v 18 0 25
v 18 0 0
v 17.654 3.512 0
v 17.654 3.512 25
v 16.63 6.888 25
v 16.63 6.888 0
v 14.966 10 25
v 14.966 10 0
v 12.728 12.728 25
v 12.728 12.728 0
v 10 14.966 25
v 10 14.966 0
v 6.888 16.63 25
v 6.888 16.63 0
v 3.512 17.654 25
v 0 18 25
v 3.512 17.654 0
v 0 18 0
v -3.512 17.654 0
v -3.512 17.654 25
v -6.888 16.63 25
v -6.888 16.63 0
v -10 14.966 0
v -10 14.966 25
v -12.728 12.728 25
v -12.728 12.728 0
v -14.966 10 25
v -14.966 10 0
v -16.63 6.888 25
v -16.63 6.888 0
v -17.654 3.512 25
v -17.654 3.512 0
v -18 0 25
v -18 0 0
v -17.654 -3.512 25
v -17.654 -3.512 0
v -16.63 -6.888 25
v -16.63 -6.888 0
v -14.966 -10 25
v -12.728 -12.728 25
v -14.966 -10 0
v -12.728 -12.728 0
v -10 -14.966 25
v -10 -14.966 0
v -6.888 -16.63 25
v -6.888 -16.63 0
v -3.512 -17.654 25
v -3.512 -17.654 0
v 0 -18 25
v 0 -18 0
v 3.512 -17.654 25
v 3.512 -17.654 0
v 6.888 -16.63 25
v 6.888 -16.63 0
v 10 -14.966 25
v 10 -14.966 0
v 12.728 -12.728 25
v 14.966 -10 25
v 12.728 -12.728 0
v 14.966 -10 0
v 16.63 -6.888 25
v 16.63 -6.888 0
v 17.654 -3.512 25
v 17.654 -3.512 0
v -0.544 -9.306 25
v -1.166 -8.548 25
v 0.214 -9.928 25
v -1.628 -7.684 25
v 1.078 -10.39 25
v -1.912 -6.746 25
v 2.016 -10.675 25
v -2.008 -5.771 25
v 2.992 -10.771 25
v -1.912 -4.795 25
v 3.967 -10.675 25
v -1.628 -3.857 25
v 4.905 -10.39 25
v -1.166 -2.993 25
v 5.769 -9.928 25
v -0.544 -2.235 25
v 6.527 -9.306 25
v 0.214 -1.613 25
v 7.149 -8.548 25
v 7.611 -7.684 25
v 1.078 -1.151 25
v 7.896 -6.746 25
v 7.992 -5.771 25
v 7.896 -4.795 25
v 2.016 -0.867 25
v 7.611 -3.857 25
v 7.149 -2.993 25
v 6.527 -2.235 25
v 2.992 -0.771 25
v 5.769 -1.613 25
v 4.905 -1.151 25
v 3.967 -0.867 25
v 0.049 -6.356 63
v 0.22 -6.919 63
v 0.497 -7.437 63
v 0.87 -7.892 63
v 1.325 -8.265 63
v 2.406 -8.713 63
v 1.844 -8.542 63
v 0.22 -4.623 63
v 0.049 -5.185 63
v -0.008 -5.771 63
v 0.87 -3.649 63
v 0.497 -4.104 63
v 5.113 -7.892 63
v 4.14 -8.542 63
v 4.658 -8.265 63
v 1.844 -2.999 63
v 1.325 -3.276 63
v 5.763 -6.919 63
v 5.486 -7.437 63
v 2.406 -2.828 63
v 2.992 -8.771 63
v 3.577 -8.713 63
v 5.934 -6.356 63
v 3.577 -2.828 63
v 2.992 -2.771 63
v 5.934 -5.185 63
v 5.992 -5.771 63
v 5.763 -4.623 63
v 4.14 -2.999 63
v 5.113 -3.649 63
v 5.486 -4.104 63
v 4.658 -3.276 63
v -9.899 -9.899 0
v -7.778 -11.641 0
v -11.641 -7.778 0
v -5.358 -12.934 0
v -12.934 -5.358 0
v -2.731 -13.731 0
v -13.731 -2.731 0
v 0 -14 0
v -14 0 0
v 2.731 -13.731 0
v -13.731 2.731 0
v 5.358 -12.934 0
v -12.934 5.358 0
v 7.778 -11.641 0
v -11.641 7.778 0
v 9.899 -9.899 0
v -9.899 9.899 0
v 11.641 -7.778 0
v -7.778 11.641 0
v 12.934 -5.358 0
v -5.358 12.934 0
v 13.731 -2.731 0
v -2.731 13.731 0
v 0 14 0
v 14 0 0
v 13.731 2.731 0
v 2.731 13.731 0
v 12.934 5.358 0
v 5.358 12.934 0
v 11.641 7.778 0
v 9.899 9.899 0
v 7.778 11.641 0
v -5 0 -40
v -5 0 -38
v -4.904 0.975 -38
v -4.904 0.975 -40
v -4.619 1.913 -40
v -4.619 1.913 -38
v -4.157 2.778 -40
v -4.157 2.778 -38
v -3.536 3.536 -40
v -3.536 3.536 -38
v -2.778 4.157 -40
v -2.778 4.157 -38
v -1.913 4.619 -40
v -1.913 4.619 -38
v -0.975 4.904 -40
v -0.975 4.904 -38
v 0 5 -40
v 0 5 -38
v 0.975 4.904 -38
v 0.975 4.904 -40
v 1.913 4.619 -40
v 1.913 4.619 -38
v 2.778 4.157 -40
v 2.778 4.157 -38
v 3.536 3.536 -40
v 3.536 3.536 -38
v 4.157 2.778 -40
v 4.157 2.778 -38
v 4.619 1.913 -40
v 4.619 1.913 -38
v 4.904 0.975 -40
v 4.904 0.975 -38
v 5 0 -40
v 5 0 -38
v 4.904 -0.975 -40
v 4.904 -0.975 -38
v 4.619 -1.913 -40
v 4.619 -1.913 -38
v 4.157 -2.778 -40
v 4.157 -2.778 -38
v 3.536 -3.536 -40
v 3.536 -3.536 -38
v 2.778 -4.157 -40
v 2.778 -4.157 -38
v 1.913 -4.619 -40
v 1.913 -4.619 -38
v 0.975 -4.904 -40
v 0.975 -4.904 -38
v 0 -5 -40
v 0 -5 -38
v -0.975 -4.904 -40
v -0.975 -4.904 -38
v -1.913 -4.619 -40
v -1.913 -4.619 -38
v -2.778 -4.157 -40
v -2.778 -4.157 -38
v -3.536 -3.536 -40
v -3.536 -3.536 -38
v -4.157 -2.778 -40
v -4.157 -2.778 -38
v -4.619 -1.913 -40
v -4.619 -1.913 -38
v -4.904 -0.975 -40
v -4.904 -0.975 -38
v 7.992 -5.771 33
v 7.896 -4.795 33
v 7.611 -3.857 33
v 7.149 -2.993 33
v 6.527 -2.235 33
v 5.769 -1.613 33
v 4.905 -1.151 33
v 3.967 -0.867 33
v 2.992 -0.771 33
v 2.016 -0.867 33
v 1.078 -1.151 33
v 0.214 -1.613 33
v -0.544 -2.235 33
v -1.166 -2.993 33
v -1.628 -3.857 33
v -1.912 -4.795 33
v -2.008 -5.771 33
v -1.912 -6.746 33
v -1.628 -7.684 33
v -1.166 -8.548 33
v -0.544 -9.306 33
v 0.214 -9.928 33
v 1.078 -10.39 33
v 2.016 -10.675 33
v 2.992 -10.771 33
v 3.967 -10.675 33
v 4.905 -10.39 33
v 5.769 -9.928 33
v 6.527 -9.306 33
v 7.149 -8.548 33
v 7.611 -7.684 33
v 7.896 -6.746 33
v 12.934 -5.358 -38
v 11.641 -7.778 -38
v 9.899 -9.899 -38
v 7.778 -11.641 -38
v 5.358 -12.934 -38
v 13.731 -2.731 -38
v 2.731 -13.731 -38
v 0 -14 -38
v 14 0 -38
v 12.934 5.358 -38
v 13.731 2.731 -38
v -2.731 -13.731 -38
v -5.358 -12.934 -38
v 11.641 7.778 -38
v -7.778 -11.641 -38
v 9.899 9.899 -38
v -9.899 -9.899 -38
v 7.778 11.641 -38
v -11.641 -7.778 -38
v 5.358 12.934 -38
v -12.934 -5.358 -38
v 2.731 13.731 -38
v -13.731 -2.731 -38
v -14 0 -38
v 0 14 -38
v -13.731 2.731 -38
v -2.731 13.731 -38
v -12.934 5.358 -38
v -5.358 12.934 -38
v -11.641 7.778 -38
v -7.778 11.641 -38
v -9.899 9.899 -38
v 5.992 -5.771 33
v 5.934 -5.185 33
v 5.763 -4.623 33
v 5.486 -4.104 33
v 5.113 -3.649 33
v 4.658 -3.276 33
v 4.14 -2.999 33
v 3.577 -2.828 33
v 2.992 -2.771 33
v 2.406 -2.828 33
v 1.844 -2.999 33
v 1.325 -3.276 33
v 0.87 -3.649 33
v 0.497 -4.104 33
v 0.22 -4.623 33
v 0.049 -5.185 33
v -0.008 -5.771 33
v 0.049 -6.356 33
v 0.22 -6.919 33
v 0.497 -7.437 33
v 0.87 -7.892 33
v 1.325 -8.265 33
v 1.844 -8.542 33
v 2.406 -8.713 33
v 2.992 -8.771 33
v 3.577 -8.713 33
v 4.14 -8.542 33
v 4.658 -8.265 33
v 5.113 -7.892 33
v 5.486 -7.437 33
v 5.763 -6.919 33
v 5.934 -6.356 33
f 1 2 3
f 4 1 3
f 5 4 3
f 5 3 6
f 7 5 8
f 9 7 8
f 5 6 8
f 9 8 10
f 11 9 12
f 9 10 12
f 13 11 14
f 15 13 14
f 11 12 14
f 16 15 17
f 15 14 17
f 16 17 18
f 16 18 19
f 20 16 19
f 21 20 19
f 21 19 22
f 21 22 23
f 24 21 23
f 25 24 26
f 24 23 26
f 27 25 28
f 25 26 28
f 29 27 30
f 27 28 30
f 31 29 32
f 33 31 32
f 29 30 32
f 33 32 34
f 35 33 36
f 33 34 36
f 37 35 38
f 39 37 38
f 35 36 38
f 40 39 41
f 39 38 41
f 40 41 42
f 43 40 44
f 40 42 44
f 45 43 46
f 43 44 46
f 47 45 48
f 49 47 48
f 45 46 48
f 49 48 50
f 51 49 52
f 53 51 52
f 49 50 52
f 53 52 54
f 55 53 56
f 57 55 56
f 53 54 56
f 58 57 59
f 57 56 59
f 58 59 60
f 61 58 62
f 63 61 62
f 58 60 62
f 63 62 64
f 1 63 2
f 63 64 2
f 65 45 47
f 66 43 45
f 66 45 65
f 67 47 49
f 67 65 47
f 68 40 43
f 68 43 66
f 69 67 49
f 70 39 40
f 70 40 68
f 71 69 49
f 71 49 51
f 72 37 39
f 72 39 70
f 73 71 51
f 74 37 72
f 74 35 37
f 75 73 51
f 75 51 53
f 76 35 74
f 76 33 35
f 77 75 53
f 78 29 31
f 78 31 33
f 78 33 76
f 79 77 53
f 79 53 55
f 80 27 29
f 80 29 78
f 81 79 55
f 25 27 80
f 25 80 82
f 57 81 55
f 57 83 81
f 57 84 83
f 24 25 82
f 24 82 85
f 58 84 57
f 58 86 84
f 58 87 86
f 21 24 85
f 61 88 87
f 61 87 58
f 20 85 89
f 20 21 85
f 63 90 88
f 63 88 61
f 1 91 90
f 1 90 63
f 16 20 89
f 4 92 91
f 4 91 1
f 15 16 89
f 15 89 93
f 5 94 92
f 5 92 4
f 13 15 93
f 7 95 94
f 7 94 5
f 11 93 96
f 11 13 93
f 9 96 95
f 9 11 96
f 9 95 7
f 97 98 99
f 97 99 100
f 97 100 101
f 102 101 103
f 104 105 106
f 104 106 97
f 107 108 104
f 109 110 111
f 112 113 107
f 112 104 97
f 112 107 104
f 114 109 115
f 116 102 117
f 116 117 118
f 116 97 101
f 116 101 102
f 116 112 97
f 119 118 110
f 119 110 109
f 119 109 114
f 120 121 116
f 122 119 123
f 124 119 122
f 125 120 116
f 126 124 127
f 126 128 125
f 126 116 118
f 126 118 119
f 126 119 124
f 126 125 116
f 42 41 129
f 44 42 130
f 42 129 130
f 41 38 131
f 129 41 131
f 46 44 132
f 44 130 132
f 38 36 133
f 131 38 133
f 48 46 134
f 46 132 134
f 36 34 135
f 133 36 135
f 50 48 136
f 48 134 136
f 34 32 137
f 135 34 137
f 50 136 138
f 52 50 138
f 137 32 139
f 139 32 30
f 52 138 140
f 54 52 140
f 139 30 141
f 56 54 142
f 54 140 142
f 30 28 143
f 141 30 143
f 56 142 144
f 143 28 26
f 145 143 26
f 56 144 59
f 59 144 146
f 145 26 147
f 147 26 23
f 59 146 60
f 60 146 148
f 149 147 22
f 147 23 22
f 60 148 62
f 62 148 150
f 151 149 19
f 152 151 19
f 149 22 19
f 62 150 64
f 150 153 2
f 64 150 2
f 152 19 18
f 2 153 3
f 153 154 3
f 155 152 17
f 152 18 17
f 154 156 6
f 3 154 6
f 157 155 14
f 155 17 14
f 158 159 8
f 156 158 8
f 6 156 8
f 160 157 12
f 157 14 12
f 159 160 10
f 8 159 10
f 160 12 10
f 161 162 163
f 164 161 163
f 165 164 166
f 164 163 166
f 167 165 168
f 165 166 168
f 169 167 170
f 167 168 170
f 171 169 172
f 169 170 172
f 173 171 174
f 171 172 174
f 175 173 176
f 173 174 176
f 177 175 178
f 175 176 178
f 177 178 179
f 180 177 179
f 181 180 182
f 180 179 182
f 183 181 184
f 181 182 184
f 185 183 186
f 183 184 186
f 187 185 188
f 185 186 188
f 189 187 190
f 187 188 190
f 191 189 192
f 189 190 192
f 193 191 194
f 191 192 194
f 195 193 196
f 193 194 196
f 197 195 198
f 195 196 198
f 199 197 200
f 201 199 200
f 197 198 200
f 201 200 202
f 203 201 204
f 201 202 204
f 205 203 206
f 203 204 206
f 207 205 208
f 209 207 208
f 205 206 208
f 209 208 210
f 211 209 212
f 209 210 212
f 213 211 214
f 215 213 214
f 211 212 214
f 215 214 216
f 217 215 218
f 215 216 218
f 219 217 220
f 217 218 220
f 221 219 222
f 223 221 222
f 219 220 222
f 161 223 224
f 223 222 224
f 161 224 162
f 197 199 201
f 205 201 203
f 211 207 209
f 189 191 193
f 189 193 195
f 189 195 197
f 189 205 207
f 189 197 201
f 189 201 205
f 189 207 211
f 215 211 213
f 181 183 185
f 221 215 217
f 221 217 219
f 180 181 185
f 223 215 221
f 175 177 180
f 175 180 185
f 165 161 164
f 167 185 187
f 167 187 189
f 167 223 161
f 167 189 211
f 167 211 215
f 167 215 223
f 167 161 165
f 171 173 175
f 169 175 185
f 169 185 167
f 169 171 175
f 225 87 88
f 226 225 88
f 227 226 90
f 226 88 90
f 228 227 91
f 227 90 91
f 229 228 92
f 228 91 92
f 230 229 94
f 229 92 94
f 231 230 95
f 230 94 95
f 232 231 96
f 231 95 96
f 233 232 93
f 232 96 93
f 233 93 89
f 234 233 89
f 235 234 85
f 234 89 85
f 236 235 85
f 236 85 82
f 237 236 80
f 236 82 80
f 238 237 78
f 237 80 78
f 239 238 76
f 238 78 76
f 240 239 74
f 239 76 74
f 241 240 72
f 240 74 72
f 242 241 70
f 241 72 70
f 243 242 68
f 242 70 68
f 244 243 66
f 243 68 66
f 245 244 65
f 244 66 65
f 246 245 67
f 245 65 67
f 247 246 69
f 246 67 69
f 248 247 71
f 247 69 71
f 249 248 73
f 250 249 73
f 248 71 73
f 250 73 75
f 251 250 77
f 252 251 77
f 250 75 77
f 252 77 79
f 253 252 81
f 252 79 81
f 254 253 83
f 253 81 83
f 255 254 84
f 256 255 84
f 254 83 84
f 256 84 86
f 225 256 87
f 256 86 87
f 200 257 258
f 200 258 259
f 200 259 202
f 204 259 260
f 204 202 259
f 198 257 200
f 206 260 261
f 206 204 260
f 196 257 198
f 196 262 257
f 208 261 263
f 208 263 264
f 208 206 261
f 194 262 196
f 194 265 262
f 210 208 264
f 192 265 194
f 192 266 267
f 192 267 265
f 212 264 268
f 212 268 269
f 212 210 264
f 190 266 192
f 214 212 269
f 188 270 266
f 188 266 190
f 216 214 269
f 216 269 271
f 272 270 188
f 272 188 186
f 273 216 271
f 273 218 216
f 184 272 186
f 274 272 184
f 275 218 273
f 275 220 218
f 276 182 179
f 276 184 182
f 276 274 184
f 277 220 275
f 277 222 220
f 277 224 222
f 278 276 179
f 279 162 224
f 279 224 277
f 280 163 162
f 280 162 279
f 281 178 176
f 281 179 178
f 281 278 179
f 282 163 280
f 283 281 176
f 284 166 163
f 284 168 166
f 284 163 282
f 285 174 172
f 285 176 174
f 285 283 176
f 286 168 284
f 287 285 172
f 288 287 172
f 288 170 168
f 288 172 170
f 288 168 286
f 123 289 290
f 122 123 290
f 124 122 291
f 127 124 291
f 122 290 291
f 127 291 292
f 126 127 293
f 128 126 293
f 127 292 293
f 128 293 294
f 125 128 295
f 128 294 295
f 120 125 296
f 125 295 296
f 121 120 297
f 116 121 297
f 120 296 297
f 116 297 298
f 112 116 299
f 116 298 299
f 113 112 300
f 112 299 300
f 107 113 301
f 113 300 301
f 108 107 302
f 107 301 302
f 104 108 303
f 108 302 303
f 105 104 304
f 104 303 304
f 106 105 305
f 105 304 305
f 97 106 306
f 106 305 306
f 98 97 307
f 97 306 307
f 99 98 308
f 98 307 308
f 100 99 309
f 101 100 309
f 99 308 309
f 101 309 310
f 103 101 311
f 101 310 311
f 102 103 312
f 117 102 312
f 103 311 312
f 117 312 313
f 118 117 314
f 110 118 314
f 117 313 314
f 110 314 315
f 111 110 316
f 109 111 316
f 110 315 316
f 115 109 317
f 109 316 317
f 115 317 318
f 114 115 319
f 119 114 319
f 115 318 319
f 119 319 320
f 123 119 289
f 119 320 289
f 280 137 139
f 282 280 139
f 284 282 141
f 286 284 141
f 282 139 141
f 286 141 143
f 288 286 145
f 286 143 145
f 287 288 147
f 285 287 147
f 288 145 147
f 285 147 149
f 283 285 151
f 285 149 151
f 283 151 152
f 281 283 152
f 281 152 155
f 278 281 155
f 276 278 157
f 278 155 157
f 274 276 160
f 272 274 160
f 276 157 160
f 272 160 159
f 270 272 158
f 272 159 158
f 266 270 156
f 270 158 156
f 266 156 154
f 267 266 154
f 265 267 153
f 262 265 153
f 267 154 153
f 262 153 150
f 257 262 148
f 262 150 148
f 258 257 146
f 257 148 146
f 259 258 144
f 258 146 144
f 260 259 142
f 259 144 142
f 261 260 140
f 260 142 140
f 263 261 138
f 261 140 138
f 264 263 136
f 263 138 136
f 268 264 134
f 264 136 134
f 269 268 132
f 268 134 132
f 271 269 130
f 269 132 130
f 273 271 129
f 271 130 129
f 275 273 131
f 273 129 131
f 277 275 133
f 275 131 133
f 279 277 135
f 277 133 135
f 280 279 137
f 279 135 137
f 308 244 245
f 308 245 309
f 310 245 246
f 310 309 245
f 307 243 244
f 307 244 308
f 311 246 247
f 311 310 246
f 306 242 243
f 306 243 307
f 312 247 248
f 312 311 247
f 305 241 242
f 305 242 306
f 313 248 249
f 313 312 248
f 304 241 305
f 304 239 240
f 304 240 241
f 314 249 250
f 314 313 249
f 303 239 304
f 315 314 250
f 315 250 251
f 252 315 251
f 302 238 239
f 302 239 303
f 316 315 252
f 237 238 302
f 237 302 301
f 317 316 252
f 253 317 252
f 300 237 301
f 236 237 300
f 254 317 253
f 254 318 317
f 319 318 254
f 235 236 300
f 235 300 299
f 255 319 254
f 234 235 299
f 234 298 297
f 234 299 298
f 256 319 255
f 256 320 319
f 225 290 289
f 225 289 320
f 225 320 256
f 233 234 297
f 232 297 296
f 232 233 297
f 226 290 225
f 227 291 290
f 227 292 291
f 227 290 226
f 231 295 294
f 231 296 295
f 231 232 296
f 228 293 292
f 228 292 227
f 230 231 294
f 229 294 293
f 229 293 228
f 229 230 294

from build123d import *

# Parameters (mm, degrees)
SKETCH1_R           = 18
BOSS_EXTRUDE1_DEPTH = 25
SKETCH2_R           = 14
BOSS_EXTRUDE2_DEPTH = 38
SKETCH3_R           = 5
BOSS_EXTRUDE3_DEPTH = 2
SKETCH4_R           = 5
BOSS_EXTRUDE4_DEPTH = 8
SKETCH5_R           = 3
BOSS_EXTRUDE5_DEPTH = 30


with BuildPart() as part:
    # Sketch1 → Boss-Extrude1 (new body)
    with BuildSketch(Plane.XY):
        Circle(SKETCH1_R)
    extrude(amount=BOSS_EXTRUDE1_DEPTH)

    # Sketch2 → Boss-Extrude2 (add)
    with BuildSketch(Plane(origin=(0, 0, 0), x_dir=(-1, 0, 0), z_dir=(0, 0, -1))):
        Circle(SKETCH2_R)
    extrude(amount=BOSS_EXTRUDE2_DEPTH)

    # Sketch3 → Boss-Extrude3 (add)
    with BuildSketch(Plane(origin=(0, 0, -38), x_dir=(-1, 0, 0), z_dir=(0, 0, -1))):
        Circle(SKETCH3_R)
    extrude(amount=BOSS_EXTRUDE3_DEPTH)

    # Sketch4 → Boss-Extrude4 (add)
    with BuildSketch(Plane.XY.offset(25)):
        with Locations((2.991643327, -5.770621301)):
            Circle(SKETCH4_R)
    extrude(amount=BOSS_EXTRUDE4_DEPTH)

    # Sketch5 → Boss-Extrude5 (add)
    with BuildSketch(Plane.XY.offset(33)):
        with Locations((2.991643327, -5.770621301)):
            Circle(SKETCH5_R)
    extrude(amount=BOSS_EXTRUDE5_DEPTH)


solid = part.part
